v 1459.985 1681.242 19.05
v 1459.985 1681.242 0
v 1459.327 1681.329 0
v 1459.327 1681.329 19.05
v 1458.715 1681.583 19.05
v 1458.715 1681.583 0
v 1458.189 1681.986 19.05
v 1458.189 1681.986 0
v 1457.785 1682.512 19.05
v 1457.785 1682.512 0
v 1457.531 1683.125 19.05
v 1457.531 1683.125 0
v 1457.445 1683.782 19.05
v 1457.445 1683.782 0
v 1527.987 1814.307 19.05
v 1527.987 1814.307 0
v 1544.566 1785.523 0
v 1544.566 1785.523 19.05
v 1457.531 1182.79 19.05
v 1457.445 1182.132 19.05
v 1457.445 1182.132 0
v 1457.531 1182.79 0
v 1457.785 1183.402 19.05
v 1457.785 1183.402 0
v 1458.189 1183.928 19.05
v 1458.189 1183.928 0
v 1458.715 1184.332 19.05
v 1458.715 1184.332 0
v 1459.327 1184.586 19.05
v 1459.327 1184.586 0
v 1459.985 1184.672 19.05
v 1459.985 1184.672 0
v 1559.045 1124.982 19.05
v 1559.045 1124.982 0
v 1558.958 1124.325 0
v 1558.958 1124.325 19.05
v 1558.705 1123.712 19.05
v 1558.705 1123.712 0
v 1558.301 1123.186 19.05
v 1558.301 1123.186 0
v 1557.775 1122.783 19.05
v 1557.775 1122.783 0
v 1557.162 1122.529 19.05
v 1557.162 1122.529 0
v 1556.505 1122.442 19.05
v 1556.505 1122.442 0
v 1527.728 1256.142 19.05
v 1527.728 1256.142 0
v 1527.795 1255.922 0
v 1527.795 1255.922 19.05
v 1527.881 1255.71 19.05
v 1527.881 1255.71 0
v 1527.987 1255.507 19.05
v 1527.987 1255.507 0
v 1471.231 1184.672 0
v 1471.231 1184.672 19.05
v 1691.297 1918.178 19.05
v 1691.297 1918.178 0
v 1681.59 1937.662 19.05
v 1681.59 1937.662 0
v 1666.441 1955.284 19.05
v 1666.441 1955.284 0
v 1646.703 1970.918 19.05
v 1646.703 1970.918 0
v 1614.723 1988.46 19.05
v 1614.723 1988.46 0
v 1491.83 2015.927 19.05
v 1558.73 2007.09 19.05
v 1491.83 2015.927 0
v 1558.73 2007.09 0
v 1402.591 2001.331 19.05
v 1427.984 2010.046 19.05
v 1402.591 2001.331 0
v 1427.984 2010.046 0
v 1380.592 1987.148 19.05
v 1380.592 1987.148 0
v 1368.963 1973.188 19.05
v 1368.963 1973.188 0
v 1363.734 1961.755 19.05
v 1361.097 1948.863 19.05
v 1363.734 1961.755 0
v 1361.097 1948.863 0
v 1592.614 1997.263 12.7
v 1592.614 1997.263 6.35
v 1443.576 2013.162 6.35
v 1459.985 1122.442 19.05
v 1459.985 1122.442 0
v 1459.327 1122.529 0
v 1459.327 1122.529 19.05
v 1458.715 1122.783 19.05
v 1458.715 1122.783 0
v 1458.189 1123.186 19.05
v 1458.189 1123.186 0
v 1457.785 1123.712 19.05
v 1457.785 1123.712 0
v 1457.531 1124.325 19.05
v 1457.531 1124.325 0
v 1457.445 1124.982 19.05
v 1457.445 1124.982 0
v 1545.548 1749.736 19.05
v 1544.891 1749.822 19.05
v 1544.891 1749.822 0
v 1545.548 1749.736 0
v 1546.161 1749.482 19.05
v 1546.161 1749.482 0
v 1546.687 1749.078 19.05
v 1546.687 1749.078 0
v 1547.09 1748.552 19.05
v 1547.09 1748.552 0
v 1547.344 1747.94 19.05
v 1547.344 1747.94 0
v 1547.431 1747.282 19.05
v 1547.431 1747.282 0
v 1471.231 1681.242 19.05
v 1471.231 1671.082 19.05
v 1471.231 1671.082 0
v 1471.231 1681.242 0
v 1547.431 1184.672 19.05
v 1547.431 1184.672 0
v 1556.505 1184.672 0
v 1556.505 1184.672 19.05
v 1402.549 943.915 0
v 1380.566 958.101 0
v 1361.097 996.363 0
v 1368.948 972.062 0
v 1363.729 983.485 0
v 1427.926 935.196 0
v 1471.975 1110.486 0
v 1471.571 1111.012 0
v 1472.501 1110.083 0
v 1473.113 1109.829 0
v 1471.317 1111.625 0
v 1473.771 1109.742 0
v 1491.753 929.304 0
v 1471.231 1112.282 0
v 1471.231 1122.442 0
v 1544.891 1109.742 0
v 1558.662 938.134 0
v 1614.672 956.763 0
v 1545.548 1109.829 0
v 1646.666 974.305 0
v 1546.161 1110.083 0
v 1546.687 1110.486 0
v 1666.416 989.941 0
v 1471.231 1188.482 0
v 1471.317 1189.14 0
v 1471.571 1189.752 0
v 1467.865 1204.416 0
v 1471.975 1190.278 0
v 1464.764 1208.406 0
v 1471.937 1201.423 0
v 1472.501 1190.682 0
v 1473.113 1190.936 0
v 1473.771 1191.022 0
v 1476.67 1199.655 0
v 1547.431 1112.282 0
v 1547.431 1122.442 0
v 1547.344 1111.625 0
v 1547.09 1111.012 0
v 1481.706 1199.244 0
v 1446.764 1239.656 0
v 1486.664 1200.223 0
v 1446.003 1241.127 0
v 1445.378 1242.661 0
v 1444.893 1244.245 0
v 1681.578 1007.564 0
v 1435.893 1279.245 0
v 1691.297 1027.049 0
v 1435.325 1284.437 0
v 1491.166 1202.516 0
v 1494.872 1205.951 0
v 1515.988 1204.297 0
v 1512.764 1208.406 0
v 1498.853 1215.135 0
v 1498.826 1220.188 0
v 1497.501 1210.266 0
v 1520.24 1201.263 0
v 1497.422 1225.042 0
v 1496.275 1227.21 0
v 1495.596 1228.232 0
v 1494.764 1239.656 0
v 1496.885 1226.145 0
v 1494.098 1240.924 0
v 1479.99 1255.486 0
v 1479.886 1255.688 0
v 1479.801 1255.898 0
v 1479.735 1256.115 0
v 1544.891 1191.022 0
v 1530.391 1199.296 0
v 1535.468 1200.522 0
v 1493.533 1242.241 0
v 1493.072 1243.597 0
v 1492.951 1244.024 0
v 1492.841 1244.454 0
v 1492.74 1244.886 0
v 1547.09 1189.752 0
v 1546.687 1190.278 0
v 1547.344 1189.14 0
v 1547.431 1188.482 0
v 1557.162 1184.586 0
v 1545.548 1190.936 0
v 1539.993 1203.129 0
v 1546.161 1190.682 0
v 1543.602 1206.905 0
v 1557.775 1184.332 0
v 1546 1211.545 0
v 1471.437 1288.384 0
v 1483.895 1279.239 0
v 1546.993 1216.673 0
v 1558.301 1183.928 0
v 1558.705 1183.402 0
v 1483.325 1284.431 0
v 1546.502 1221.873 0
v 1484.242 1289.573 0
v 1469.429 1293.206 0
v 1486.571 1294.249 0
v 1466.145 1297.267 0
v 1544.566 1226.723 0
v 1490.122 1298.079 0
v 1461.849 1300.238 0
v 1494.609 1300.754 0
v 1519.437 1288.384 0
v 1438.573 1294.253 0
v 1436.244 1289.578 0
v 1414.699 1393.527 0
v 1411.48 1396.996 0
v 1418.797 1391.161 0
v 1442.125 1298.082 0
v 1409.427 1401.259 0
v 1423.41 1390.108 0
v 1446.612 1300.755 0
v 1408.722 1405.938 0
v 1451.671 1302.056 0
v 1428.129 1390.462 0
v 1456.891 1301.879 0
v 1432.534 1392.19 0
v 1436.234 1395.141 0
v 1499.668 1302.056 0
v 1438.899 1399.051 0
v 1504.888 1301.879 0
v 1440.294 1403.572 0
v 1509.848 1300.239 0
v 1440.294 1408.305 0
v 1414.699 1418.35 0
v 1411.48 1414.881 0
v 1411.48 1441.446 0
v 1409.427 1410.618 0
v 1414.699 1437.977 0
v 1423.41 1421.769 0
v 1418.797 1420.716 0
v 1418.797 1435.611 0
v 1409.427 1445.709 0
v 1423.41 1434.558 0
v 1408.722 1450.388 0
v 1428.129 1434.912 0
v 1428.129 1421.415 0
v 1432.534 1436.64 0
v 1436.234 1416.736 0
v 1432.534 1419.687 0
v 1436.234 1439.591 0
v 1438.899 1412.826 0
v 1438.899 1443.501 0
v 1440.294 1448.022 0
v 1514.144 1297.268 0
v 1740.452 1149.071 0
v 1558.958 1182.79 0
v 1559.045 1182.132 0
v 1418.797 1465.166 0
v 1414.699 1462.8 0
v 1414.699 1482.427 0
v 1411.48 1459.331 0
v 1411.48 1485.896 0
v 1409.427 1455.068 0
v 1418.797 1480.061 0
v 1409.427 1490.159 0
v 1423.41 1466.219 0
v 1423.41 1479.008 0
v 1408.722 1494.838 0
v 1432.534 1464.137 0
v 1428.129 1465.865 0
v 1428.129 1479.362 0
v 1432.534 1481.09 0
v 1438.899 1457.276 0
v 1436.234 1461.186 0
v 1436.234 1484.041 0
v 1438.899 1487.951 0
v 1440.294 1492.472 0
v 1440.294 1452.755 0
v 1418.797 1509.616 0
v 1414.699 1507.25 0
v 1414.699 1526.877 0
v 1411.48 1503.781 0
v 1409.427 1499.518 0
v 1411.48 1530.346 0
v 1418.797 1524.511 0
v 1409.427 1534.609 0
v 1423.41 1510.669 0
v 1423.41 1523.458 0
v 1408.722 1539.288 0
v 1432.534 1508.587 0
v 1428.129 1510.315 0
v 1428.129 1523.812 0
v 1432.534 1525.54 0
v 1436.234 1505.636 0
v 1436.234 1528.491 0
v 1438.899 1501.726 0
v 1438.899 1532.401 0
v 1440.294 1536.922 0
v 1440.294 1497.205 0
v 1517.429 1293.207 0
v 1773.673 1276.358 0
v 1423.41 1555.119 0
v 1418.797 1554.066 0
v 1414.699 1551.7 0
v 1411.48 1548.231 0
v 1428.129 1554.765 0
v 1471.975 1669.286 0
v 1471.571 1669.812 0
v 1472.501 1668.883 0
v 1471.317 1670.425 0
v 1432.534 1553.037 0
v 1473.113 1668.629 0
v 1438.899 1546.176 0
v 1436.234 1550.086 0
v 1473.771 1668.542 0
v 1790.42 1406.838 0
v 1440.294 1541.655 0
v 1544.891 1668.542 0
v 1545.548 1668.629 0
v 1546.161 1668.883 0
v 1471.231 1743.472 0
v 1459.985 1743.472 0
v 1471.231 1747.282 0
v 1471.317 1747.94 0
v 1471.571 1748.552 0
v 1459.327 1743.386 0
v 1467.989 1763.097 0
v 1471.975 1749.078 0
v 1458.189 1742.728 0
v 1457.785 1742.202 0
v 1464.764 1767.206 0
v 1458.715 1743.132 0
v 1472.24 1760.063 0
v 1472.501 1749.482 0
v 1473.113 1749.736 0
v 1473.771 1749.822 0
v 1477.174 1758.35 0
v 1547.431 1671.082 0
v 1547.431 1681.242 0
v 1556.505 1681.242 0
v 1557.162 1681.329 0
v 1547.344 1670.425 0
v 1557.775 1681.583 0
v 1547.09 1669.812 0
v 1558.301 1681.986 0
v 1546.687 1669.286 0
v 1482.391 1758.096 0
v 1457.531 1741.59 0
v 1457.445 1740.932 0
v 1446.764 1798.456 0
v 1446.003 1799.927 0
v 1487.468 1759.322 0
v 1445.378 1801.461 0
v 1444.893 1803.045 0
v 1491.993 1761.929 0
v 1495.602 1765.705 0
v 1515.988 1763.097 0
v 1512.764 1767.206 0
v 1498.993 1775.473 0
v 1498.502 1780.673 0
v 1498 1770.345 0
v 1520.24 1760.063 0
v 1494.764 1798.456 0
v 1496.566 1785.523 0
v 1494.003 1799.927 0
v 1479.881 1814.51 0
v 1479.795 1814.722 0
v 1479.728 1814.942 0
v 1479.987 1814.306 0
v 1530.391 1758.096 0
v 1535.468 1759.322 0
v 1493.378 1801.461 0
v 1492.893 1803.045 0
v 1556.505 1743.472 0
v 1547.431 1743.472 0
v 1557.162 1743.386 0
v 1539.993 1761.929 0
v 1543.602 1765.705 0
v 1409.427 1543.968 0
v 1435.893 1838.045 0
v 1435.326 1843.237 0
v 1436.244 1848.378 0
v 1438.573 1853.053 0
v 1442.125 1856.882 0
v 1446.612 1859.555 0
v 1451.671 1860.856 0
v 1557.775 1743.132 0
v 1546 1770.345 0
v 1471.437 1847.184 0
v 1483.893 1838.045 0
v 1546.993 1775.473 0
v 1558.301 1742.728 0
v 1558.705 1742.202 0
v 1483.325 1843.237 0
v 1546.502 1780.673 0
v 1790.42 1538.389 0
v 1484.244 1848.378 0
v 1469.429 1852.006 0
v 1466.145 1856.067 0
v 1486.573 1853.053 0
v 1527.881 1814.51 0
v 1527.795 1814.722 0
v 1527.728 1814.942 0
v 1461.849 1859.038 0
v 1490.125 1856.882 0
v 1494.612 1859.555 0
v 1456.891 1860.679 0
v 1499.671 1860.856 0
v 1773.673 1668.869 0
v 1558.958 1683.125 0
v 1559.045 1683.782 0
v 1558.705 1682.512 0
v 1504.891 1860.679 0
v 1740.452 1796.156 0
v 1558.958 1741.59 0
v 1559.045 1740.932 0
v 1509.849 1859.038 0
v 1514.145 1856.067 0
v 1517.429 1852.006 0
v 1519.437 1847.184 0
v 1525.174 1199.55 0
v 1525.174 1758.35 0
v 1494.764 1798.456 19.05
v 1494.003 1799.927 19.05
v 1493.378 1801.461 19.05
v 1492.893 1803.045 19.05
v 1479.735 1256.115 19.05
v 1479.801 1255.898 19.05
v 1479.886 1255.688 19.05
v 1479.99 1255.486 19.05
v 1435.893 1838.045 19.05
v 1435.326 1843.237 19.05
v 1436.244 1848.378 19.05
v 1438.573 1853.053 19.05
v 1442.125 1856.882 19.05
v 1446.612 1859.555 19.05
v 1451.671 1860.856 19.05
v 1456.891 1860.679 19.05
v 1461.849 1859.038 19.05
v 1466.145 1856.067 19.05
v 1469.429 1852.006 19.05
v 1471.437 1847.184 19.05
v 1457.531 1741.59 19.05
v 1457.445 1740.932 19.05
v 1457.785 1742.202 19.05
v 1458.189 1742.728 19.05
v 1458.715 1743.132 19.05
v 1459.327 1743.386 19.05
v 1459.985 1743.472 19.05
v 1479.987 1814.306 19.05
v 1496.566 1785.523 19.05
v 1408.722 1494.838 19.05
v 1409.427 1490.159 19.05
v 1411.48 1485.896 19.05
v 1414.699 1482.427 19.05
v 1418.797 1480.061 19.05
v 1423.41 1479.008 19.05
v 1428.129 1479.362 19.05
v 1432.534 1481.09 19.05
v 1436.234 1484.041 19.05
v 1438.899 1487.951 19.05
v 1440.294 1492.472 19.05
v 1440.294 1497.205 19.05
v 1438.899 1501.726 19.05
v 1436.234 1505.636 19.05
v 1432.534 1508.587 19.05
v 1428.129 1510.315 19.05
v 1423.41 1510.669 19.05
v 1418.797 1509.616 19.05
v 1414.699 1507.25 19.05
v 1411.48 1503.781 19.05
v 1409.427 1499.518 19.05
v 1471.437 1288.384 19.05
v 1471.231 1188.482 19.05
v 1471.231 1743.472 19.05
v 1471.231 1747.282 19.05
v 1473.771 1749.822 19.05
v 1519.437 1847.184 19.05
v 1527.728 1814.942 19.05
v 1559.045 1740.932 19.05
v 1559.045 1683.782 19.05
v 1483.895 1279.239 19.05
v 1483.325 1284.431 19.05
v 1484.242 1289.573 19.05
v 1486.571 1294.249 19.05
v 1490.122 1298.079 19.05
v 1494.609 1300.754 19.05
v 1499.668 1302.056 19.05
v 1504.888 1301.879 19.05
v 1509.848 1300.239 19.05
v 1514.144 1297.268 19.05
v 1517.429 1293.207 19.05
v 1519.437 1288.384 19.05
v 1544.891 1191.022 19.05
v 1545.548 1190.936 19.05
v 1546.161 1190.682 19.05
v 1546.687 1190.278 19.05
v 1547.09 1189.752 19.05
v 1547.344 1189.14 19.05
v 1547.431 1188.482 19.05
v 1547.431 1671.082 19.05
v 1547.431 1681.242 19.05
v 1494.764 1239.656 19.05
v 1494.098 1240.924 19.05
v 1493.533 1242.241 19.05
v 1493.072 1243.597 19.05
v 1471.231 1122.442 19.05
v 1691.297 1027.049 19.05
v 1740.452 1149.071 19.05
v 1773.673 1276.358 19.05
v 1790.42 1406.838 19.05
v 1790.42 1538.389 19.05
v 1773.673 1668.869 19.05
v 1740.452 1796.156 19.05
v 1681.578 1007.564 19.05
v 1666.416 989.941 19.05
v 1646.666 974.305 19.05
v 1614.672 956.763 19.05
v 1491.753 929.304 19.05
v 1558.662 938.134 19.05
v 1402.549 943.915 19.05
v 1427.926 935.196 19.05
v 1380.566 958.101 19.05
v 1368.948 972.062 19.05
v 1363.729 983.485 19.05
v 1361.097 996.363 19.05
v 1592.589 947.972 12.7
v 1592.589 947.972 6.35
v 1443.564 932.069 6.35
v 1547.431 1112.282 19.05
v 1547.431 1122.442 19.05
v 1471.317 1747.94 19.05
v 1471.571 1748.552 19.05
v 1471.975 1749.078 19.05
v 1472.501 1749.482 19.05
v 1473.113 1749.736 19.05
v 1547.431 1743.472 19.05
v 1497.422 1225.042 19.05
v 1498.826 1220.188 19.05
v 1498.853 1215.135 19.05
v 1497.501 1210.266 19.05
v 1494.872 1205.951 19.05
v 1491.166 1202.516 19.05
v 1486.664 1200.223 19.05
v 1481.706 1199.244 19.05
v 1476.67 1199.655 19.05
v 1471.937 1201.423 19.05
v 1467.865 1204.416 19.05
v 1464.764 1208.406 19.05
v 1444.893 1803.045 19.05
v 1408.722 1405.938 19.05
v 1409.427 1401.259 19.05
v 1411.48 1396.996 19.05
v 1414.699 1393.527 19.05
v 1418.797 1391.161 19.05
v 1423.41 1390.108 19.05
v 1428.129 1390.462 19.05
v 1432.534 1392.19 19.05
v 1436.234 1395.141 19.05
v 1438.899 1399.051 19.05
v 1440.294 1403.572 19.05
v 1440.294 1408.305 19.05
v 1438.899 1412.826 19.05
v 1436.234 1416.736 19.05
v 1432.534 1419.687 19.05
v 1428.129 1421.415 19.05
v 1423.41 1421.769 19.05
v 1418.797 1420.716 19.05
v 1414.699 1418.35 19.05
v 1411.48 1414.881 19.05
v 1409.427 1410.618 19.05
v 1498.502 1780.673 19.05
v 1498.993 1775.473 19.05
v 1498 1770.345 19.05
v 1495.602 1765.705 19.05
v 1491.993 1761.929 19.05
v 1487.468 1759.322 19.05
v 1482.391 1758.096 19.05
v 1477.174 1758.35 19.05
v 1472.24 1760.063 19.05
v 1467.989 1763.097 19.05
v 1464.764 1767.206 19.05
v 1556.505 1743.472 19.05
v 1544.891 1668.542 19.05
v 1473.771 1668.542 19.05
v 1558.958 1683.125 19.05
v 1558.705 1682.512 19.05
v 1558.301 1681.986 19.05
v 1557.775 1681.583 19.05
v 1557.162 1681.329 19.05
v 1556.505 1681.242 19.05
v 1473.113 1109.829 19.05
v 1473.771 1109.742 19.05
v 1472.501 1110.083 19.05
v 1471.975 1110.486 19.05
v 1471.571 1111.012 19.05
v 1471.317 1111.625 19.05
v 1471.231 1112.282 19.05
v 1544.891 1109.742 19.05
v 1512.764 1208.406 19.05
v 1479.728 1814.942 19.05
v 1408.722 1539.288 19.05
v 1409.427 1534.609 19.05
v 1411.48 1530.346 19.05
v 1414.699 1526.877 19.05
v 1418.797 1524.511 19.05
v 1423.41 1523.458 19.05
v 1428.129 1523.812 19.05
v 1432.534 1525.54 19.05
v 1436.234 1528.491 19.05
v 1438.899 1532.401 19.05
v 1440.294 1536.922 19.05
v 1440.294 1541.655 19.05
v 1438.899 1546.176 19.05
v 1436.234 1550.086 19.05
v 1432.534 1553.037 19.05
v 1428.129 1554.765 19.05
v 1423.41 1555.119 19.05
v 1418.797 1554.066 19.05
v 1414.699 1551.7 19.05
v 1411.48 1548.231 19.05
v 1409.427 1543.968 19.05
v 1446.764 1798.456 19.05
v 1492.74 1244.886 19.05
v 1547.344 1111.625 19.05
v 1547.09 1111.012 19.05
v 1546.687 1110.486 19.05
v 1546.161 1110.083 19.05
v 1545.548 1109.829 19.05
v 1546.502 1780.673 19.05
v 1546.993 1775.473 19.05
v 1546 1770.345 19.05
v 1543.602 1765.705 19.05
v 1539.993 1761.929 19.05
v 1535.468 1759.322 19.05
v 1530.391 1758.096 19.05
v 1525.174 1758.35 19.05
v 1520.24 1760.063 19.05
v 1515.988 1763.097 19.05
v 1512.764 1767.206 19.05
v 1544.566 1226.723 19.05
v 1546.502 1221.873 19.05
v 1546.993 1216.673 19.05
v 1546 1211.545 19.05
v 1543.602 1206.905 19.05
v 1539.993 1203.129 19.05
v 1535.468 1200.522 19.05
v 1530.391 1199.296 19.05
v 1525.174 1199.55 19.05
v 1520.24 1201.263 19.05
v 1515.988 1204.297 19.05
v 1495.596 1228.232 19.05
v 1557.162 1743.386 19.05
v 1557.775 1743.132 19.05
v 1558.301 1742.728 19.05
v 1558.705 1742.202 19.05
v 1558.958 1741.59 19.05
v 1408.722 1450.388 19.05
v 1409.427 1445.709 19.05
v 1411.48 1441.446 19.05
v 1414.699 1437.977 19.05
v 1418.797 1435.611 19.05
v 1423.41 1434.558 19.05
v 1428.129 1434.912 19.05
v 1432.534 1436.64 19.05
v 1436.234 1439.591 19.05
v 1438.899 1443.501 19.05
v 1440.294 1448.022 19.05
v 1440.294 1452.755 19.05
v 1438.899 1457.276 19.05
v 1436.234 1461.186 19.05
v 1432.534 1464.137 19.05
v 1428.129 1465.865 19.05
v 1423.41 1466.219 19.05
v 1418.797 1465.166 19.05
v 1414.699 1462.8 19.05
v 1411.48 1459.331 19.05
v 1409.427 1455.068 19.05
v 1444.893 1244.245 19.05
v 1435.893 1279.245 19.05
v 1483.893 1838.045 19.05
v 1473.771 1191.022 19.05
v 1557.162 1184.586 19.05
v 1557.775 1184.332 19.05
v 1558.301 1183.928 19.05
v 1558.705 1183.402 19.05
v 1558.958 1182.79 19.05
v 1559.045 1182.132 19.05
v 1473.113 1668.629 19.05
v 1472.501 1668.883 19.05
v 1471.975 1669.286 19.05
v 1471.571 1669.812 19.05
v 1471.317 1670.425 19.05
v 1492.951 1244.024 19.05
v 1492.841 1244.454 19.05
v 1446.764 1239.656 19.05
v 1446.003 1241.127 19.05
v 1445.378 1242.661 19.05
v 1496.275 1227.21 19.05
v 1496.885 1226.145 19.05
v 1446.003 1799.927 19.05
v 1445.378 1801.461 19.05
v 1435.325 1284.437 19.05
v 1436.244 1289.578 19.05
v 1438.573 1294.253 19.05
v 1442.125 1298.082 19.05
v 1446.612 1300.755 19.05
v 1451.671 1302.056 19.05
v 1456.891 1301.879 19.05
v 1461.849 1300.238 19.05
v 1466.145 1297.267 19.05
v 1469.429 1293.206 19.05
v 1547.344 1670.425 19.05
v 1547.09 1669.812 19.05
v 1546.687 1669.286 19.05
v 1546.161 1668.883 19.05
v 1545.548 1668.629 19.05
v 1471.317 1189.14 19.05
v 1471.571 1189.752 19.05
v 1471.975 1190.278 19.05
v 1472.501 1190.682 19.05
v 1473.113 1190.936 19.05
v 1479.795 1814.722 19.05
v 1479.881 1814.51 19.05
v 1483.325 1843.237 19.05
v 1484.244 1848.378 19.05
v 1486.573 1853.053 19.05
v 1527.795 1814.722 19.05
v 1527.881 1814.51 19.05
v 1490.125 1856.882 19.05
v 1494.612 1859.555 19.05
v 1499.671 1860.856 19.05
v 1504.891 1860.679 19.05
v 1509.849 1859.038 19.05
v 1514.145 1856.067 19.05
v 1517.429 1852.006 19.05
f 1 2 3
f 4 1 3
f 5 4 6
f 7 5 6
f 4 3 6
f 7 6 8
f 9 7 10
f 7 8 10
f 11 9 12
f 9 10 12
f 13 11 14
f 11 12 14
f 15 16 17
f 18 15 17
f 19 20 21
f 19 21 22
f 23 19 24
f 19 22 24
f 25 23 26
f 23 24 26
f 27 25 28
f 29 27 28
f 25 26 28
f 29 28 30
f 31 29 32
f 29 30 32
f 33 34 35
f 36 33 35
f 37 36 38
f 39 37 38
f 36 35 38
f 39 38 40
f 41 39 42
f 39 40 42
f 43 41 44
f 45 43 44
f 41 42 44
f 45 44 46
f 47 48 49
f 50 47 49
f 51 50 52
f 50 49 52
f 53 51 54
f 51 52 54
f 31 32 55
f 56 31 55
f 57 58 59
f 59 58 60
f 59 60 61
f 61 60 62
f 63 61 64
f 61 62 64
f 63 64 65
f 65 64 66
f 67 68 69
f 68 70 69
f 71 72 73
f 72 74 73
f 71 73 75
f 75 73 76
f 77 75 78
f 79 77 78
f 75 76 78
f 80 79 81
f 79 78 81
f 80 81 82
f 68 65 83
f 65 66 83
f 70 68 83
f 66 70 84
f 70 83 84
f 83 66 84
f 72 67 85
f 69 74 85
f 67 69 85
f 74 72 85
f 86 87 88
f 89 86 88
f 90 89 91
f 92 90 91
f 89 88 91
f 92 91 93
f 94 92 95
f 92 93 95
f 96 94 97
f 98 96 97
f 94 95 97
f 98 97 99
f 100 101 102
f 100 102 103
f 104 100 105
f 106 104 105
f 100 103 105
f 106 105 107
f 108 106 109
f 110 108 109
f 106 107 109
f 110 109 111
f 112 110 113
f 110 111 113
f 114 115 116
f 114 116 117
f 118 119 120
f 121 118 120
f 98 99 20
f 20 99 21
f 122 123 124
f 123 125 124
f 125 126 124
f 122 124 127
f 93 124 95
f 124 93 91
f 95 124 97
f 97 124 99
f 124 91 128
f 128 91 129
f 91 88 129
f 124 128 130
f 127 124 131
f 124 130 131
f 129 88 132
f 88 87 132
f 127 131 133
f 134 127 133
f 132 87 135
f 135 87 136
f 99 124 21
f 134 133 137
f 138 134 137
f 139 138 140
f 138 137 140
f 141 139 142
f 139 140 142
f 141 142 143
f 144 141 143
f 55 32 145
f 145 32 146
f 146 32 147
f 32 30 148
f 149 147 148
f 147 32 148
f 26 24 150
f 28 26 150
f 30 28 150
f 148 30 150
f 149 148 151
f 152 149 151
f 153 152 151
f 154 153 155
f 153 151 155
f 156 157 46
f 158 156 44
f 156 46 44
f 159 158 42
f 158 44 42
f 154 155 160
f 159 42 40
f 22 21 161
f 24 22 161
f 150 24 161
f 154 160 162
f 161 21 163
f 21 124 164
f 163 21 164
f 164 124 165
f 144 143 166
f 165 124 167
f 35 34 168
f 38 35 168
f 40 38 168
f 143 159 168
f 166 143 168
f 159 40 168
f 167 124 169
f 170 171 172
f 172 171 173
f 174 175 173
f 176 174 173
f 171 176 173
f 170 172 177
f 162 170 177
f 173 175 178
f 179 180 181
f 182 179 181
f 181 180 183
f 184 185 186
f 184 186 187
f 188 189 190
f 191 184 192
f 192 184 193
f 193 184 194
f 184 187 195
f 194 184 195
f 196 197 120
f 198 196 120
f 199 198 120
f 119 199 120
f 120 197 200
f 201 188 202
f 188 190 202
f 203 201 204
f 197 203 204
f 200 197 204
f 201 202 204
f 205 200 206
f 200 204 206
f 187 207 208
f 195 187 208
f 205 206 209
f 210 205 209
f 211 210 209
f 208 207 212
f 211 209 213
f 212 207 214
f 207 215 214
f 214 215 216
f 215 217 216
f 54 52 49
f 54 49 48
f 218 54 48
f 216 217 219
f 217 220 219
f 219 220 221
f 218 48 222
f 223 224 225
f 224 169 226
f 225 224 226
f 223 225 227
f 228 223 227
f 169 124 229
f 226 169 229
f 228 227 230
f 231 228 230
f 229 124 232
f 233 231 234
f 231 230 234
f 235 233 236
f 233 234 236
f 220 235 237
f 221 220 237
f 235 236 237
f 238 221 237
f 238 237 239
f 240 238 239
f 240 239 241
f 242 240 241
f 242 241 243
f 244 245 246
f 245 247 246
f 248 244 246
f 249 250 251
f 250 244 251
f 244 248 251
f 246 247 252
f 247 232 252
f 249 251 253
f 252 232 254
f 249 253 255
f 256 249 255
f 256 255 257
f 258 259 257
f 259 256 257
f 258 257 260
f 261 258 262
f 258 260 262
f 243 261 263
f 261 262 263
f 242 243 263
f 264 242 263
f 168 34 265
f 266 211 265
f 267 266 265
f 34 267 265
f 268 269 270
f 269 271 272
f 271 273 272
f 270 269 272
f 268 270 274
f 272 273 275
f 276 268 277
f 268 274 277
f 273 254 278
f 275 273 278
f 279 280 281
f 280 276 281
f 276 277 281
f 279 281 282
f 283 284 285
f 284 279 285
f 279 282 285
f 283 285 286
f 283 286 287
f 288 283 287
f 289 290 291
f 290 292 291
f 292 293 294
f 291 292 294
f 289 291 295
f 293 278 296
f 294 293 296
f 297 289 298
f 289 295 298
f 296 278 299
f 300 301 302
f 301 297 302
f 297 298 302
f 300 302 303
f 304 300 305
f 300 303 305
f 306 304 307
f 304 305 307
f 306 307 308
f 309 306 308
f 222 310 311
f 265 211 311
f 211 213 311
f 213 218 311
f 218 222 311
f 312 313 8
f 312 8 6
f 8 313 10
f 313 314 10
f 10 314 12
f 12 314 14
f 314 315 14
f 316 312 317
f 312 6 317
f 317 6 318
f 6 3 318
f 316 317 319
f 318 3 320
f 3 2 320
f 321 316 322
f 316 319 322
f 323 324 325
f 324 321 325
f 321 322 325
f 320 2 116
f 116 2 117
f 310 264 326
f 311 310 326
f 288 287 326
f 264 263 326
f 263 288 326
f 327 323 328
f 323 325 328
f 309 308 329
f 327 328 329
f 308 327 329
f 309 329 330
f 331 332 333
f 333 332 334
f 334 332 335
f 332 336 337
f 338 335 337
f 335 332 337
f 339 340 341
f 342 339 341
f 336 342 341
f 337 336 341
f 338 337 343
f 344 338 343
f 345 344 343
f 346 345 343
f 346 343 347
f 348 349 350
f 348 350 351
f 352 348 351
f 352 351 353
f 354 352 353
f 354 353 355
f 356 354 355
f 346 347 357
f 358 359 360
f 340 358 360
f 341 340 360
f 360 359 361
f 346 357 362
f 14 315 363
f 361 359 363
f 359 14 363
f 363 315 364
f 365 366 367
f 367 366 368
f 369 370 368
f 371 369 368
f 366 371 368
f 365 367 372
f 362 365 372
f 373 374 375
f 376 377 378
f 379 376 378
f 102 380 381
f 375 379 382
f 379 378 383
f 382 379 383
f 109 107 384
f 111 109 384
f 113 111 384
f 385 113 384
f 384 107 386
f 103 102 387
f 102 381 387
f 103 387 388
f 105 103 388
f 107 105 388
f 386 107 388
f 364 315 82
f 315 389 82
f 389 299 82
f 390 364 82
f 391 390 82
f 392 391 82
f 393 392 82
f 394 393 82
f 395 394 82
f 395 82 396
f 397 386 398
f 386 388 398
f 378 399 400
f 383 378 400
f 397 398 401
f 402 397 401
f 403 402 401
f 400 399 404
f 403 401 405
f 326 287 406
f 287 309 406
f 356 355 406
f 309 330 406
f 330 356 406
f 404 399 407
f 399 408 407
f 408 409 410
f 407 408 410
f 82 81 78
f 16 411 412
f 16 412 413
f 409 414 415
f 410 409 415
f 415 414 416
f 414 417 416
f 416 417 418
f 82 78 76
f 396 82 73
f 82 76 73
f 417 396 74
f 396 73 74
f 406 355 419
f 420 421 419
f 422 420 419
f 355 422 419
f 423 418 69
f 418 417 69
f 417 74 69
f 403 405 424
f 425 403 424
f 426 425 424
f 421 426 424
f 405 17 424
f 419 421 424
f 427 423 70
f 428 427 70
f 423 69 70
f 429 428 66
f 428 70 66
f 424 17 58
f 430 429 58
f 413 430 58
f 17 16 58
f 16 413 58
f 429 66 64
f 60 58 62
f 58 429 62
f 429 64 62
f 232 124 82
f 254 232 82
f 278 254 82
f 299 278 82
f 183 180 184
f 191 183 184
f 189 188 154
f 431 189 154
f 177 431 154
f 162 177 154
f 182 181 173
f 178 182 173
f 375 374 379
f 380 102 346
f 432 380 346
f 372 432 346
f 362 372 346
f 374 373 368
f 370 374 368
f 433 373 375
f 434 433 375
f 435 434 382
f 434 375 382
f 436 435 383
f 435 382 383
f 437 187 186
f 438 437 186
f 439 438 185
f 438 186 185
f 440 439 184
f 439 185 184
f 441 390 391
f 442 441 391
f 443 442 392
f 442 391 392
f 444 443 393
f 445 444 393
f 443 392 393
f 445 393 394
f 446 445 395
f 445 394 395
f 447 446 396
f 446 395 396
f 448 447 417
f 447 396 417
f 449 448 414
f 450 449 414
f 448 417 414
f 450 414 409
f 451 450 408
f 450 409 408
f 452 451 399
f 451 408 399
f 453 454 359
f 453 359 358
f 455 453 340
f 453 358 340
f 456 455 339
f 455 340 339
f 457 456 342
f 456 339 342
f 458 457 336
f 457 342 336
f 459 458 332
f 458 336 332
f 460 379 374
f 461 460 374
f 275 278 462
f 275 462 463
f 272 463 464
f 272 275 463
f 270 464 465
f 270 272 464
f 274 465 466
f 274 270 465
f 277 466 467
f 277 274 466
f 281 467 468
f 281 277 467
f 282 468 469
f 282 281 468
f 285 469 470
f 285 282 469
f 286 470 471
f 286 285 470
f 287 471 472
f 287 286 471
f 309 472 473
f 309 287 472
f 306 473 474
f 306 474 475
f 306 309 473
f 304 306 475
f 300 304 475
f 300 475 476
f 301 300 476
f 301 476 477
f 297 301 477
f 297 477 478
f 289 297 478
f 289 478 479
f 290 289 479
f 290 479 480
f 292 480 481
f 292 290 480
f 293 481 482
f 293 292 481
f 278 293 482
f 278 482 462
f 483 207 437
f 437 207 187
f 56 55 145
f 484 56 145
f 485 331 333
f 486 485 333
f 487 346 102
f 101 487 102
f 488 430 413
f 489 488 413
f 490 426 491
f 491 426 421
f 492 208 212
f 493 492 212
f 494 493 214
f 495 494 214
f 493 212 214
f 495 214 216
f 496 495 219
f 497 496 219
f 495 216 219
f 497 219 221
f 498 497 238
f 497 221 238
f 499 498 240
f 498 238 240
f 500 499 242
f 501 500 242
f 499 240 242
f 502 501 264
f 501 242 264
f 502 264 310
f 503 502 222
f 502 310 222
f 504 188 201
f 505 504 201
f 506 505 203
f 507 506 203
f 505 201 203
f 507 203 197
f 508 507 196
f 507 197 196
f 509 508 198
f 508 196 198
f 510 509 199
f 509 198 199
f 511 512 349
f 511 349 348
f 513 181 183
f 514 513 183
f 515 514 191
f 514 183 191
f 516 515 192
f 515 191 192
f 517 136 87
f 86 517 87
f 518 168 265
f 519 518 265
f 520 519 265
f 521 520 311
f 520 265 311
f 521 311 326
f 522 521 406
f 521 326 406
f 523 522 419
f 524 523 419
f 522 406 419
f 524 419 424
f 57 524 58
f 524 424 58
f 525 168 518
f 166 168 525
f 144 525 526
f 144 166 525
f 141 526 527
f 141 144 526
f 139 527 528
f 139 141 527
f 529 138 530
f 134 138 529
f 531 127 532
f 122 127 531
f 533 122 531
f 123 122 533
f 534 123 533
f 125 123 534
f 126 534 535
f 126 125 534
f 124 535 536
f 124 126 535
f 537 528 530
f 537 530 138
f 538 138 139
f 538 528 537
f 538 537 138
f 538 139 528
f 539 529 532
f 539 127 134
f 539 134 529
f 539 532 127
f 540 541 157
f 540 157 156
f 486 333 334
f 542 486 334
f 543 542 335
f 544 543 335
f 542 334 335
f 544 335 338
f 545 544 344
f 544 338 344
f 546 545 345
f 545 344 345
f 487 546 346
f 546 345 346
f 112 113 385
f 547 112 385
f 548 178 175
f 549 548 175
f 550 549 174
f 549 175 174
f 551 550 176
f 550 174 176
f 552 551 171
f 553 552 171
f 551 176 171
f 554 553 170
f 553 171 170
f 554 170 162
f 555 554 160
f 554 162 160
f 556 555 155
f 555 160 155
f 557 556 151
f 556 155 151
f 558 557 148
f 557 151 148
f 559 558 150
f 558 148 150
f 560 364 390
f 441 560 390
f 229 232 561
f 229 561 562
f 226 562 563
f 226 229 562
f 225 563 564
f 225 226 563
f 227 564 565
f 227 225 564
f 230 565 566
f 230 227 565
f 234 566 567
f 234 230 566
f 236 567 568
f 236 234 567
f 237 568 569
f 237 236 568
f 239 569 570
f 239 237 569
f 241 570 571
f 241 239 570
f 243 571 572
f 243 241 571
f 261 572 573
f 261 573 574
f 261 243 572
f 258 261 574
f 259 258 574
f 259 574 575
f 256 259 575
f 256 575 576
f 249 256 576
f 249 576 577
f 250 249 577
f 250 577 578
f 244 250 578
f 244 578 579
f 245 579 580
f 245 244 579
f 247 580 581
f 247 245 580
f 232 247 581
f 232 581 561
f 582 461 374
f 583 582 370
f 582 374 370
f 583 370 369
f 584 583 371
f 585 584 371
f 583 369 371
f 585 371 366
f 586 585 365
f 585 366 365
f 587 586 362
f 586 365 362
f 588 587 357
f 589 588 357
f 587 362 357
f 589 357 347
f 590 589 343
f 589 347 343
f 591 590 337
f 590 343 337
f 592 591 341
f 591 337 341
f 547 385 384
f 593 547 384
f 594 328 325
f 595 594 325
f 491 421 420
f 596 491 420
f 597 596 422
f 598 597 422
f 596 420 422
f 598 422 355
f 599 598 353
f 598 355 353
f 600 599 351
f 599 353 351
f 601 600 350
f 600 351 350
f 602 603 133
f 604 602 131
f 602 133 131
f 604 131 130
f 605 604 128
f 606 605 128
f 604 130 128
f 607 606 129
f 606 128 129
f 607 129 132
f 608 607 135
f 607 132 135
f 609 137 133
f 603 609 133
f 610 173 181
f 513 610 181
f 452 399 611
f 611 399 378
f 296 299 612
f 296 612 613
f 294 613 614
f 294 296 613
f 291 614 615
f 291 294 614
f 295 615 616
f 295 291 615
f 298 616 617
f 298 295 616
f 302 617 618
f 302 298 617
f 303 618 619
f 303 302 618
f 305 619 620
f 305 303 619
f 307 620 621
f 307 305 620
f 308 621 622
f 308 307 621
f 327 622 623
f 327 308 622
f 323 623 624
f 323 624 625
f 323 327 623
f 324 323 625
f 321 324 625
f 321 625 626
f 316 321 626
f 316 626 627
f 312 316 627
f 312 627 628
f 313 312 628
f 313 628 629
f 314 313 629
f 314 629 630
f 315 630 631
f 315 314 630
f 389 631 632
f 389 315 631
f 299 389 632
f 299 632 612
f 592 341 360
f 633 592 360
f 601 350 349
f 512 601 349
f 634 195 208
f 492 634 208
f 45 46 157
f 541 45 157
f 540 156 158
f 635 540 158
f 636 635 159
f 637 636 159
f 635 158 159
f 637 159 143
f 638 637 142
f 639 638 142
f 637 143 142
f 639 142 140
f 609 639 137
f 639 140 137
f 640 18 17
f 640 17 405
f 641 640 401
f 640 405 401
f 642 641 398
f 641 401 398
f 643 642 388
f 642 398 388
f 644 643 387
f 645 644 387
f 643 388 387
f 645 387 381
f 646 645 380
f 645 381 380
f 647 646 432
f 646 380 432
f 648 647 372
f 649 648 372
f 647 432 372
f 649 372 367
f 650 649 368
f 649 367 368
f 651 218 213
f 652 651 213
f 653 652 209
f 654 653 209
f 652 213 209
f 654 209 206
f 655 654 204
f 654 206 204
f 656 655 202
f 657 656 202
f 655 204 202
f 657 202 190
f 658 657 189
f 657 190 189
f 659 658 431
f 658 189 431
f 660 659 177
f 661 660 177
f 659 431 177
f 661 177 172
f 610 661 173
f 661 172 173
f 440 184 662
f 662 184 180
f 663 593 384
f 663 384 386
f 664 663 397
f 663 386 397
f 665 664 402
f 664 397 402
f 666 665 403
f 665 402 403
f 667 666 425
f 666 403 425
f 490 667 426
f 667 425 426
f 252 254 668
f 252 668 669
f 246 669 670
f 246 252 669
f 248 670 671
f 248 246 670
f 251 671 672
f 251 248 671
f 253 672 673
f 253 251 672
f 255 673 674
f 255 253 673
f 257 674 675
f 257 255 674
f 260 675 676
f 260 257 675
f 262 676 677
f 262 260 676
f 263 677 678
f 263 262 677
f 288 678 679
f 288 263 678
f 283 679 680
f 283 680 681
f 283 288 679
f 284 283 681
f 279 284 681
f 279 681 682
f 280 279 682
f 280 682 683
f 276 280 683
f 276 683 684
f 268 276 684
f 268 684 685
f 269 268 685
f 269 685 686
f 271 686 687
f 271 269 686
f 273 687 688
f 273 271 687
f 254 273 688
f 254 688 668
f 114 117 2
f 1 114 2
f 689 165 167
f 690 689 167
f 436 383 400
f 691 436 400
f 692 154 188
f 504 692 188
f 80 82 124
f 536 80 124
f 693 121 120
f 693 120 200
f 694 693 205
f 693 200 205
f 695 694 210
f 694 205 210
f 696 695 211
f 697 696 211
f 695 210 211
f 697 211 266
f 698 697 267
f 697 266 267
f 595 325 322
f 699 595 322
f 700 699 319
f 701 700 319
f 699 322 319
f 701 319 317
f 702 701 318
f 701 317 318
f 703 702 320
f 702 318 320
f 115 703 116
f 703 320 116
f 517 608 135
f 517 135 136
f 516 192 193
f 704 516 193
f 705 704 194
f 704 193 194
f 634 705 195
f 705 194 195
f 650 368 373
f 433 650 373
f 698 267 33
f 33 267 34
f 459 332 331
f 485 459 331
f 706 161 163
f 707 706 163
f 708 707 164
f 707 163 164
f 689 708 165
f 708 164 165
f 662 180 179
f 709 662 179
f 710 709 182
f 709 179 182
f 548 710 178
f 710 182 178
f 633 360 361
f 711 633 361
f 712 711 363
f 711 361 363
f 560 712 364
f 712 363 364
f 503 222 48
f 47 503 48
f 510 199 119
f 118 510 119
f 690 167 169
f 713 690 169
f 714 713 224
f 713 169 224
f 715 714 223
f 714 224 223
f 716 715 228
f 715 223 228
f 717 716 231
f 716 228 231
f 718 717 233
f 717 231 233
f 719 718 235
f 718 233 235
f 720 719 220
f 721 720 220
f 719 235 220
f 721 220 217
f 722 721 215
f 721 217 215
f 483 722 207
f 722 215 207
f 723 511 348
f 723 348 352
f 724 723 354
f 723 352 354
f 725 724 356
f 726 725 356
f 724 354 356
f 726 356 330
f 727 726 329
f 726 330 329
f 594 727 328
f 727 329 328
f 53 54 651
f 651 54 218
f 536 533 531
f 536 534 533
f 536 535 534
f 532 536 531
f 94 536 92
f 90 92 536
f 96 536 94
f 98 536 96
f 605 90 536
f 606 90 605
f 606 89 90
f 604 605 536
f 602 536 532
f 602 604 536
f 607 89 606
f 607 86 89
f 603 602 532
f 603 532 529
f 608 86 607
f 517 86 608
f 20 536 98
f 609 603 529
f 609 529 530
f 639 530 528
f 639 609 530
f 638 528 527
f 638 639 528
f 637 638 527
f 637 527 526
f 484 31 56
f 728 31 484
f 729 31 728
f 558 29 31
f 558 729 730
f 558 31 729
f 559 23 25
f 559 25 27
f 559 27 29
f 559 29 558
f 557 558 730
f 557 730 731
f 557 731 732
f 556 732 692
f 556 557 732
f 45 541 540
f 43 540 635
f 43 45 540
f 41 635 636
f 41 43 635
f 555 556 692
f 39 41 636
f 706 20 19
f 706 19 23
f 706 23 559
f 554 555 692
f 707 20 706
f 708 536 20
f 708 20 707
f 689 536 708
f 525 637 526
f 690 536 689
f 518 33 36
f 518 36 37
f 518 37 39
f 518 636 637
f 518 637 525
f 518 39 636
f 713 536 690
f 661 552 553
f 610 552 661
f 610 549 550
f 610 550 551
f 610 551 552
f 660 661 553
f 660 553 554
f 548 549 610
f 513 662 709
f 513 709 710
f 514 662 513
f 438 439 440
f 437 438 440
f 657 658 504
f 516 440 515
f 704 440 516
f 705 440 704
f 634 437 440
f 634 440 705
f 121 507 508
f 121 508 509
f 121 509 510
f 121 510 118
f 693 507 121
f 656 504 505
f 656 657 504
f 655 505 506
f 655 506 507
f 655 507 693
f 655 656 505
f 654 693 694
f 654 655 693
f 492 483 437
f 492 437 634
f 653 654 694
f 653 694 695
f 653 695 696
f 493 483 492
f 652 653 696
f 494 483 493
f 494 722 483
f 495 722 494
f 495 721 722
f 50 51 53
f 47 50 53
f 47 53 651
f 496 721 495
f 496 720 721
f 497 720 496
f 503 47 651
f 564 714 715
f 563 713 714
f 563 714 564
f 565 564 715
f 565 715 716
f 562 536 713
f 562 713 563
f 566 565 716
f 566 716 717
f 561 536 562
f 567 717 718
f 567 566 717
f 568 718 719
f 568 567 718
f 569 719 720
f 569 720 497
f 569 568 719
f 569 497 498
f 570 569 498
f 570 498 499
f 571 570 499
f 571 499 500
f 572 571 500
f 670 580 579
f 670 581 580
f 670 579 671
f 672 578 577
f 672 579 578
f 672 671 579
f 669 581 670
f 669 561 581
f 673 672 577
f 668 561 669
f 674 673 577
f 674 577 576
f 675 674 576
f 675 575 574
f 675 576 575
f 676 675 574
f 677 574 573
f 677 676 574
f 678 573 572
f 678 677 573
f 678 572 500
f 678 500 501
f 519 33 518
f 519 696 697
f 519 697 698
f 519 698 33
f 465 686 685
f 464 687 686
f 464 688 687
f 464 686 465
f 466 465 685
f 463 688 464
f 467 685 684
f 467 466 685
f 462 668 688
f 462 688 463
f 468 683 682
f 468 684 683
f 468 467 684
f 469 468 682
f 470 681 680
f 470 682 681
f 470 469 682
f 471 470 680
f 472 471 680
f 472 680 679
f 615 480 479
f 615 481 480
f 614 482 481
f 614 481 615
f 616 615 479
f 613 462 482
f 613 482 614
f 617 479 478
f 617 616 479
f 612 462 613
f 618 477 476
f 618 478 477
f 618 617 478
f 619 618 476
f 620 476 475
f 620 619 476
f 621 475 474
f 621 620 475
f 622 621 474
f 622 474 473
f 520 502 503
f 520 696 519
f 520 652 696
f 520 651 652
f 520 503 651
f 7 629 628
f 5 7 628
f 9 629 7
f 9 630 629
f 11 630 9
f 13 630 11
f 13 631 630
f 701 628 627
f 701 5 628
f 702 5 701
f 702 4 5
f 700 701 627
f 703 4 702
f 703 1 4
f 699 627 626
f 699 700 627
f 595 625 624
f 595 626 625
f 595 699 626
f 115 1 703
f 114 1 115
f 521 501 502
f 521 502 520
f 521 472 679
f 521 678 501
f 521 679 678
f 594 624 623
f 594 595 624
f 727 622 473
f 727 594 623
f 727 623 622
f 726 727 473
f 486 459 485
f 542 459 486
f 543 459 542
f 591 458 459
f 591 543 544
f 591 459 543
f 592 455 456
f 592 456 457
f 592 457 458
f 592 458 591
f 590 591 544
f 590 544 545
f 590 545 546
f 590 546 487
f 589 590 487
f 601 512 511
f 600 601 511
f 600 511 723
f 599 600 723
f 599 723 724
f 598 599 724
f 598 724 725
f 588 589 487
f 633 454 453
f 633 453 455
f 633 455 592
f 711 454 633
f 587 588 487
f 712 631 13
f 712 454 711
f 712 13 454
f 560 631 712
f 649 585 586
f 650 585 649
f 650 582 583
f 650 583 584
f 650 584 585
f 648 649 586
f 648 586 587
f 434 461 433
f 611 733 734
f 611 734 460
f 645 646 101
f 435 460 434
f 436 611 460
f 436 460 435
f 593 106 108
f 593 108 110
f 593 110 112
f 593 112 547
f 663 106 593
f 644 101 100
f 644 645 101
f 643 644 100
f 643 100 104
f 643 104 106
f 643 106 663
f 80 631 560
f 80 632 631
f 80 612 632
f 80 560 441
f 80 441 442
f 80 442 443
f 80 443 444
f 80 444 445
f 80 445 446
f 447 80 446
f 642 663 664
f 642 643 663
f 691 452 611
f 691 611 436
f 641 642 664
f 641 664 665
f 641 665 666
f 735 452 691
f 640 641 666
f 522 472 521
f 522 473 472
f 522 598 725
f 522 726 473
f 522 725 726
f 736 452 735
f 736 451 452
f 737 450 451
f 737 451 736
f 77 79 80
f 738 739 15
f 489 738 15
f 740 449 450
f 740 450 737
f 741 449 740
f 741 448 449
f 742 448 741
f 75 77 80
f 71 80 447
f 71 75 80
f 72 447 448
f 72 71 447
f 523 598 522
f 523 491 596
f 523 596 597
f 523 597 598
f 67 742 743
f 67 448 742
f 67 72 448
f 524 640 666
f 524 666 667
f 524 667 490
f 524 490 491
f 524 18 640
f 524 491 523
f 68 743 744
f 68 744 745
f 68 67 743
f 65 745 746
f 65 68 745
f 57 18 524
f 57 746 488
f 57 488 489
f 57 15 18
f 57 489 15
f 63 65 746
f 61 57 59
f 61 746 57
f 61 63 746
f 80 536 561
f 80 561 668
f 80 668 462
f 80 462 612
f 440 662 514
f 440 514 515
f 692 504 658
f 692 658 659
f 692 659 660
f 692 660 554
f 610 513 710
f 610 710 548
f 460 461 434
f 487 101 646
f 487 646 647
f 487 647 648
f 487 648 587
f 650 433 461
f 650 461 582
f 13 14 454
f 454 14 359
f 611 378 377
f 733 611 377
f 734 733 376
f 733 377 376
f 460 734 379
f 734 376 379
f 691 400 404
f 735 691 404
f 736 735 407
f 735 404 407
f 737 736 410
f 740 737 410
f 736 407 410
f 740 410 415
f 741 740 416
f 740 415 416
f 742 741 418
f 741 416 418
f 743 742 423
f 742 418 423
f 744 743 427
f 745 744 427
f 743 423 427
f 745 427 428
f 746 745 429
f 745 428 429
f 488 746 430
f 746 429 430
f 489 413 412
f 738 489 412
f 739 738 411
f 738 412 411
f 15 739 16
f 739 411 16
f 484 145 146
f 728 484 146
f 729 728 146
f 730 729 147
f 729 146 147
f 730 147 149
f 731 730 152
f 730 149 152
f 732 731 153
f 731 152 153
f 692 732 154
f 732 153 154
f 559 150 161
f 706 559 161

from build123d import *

# Parameters (mm, degrees)
SKETCH19_R          = 15.875
BOSS_EXTRUDE2_DEPTH = 19.05


with BuildPart() as part:
    # Sketch19 → Boss-Extrude2 (new body)
    with BuildSketch(Plane.XY):
        with BuildLine():
            add(Edge.make_bspline(
                [(1691.296561672, 1918.177904127), (1656.762851887, 2023.18607917), (1371.325091688, 2058.930160841), (1361.096561672, 1948.863494174)],
                knots=[0, 0, 0, 0, 7.638294788, 7.638294788, 7.638294788, 7.638294788], degree=3))
            Line((1361.096561672, 1948.863494174), (1361.096561672, 996.363494174))
            add(Edge.make_bspline(
                [(1691.296561672, 1027.049084222), (1656.707719979, 922.059056278), (1371.325091688, 886.296827508), (1361.096561672, 996.363494174)],
                knots=[0, 0, 0, 0, 7.629784399, 7.629784399, 7.629784399, 7.629784399], degree=3))
            ThreePointArc((1691.296561672, 1027.049084222), (1792.519416014, 1472.613494174), (1691.296561672, 1918.177904127))
        make_face()
        with BuildLine():
            Line((1556.504865632, 1122.44241392), (1547.43077252, 1122.44241392))
            Line((1547.43077252, 1122.44241392), (1547.43077252, 1112.28241392))
            ThreePointArc((1547.43077252, 1112.28241392), (1546.686823744, 1110.486362696), (1544.89077252, 1109.74241392))
            Line((1544.89077252, 1109.74241392), (1473.77077252, 1109.74241392))
            ThreePointArc((1473.77077252, 1109.74241392), (1471.974721296, 1110.486362696), (1471.23077252, 1112.28241392))
            Line((1471.23077252, 1112.28241392), (1471.23077252, 1122.44241392))
            Line((1471.23077252, 1122.44241392), (1459.984865632, 1122.44241392))
            ThreePointArc((1459.984865632, 1122.44241392), (1458.188814408, 1123.186362696), (1457.444865632, 1124.98241392))
            Line((1457.444865632, 1124.98241392), (1457.444865632, 1182.13241392))
            ThreePointArc((1457.444865632, 1182.13241392), (1458.188814408, 1183.928465145), (1459.984865632, 1184.67241392))
            Line((1459.984865632, 1184.67241392), (1471.23077252, 1184.67241392))
            Line((1471.23077252, 1184.67241392), (1471.23077252, 1188.48241392))
            ThreePointArc((1471.23077252, 1188.48241392), (1471.974721296, 1190.278465145), (1473.77077252, 1191.02241392))
            Line((1473.77077252, 1191.02241392), (1544.89077252, 1191.02241392))
            ThreePointArc((1544.89077252, 1191.02241392), (1546.686823744, 1190.278465145), (1547.43077252, 1188.48241392))
            Line((1547.43077252, 1188.48241392), (1547.43077252, 1184.67241392))
            Line((1547.43077252, 1184.67241392), (1556.504865632, 1184.67241392))
            ThreePointArc((1556.504865632, 1184.67241392), (1558.300916856, 1183.928465145), (1559.044865632, 1182.13241392))
            Line((1559.044865632, 1182.13241392), (1559.044865632, 1124.98241392))
            ThreePointArc((1559.044865632, 1124.98241392), (1558.300916856, 1123.186362696), (1556.504865632, 1122.44241392))
        make_face(mode=Mode.SUBTRACT)
        with BuildLine():
            Line((1444.893065071, 1244.244623225), (1435.893057671, 1279.244553225))
            ThreePointArc((1435.893057671, 1279.244553225), (1449.094985702, 1301.58631231), (1471.436744787, 1288.384384279))
            Line((1471.436744787, 1288.384384279), (1479.734522372, 1256.115340295))
            ThreePointArc((1479.734522372, 1256.115340295), (1479.841246759, 1255.791962976), (1479.990269115, 1255.485768066))
            Line((1479.990269115, 1255.485768066), (1495.595800102, 1228.231937145))
            ThreePointArc((1495.595800102, 1228.231937145), (1496.589194493, 1226.682766417), (1497.422422708, 1225.041884612))
            ThreePointArc((1497.422422708, 1225.041884612), (1488.994111708, 1201.213784587), (1464.764130707, 1208.40564094))
            Line((1464.764130707, 1208.40564094), (1446.764069078, 1239.655616711))
            ThreePointArc((1446.764069078, 1239.655616711), (1445.672935755, 1241.886666839), (1444.893065071, 1244.244623225))
        make_face(mode=Mode.SUBTRACT)
        with Locations(Location((1424.596561672, 1405.938494174, 0), (0, 0, 180))):
            Circle(SKETCH19_R, mode=Mode.SUBTRACT)
        with Locations(Location((1424.596561672, 1450.388494174, 0), (0, 0, 180))):
            Circle(SKETCH19_R, mode=Mode.SUBTRACT)
        with BuildLine():
            Line((1527.986726026, 1255.506514787), (1544.56575997, 1226.723451874))
            ThreePointArc((1544.56575997, 1226.723451874), (1537.823790218, 1201.663704337), (1512.764042681, 1208.405674089))
            Line((1512.764042681, 1208.405674089), (1494.764045881, 1239.655687936))
            ThreePointArc((1494.764045881, 1239.655687936), (1493.802589185, 1241.576837352), (1493.072252129, 1243.597189262))
            ThreePointArc((1493.072252129, 1243.597189262), (1492.894588833, 1244.238723731), (1492.740311476, 1244.886280075))
            Line((1492.740311476, 1244.886280075), (1483.894581433, 1279.238653731))
            ThreePointArc((1483.894581433, 1279.238653731), (1497.09201275, 1301.585586702), (1519.436740684, 1288.384422355))
            Line((1519.436740684, 1288.384422355), (1527.727745028, 1256.141718681))
            ThreePointArc((1527.727745028, 1256.141718681), (1527.835693423, 1255.815333734), (1527.986726026, 1255.506514787))
        make_face(mode=Mode.SUBTRACT)
        with Locations(Location((1424.596561672, 1494.838494174, 0), (0, 0, 180))):
            Circle(SKETCH19_R, mode=Mode.SUBTRACT)
        with Locations(Location((1424.596561672, 1539.288494174, 0), (0, 0, 180))):
            Circle(SKETCH19_R, mode=Mode.SUBTRACT)
        with BuildLine():
            Line((1547.43077252, 1681.24241392), (1547.43077252, 1671.08241392))
            ThreePointArc((1547.43077252, 1671.08241392), (1546.686823744, 1669.286362696), (1544.89077252, 1668.54241392))
            Line((1544.89077252, 1668.54241392), (1473.77077252, 1668.54241392))
            ThreePointArc((1473.77077252, 1668.54241392), (1471.974721296, 1669.286362696), (1471.23077252, 1671.08241392))
            Line((1471.23077252, 1671.08241392), (1471.23077252, 1681.24241392))
            Line((1471.23077252, 1681.24241392), (1459.984865632, 1681.24241392))
            ThreePointArc((1459.984865632, 1681.24241392), (1458.188814408, 1681.986362696), (1457.444865632, 1683.78241392))
            Line((1457.444865632, 1683.78241392), (1457.444865632, 1740.93241392))
            ThreePointArc((1457.444865632, 1740.93241392), (1458.188814408, 1742.728465145), (1459.984865632, 1743.47241392))
            Line((1459.984865632, 1743.47241392), (1471.23077252, 1743.47241392))
            Line((1471.23077252, 1743.47241392), (1471.23077252, 1747.28241392))
            ThreePointArc((1471.23077252, 1747.28241392), (1471.974721296, 1749.078465145), (1473.77077252, 1749.82241392))
            Line((1473.77077252, 1749.82241392), (1544.89077252, 1749.82241392))
            ThreePointArc((1544.89077252, 1749.82241392), (1546.686823744, 1749.078465145), (1547.43077252, 1747.28241392))
            Line((1547.43077252, 1747.28241392), (1547.43077252, 1743.47241392))
            Line((1547.43077252, 1743.47241392), (1556.504865632, 1743.47241392))
            ThreePointArc((1556.504865632, 1743.47241392), (1558.300916856, 1742.728465145), (1559.044865632, 1740.93241392))
            Line((1559.044865632, 1740.93241392), (1559.044865632, 1683.78241392))
            ThreePointArc((1559.044865632, 1683.78241392), (1558.300916856, 1681.986362696), (1556.504865632, 1681.24241392))
            Line((1556.504865632, 1681.24241392), (1547.43077252, 1681.24241392))
        make_face(mode=Mode.SUBTRACT)
        with BuildLine():
            Line((1444.893131568, 1803.044661302), (1435.893124168, 1838.044591302))
            ThreePointArc((1435.893124168, 1838.044591302), (1449.095052199, 1860.386350386), (1471.436811284, 1847.184422355))
            Line((1471.436811284, 1847.184422355), (1479.727821657, 1814.941695236))
            ThreePointArc((1479.727821657, 1814.941695236), (1479.835768961, 1814.615312965), (1479.98679977, 1814.30649635))
            Line((1479.98679977, 1814.30649635), (1496.565772911, 1785.52338757))
            ThreePointArc((1496.565772911, 1785.52338757), (1489.823779303, 1760.463721825), (1464.764105889, 1767.205686923))
            Line((1464.764105889, 1767.205686923), (1446.764116481, 1798.455687936))
            ThreePointArc((1446.764116481, 1798.455687936), (1445.672995031, 1800.686722627), (1444.893131568, 1803.044661302))
        make_face(mode=Mode.SUBTRACT)
        with BuildLine():
            Line((1492.893060968, 1803.044661302), (1483.893053568, 1838.044591302))
            ThreePointArc((1483.893053568, 1838.044591302), (1497.094981599, 1860.386350386), (1519.436740684, 1847.184422355))
            Line((1519.436740684, 1847.184422355), (1527.727745028, 1814.941718681))
            ThreePointArc((1527.727745028, 1814.941718681), (1527.835693423, 1814.615333734), (1527.986726026, 1814.306514787))
            Line((1527.986726026, 1814.306514787), (1544.56575257, 1785.523464721))
            ThreePointArc((1544.56575257, 1785.523464721), (1537.823782818, 1760.463717184), (1512.764035281, 1767.205686936))
            Line((1512.764035281, 1767.205686936), (1494.764045881, 1798.455687936))
            ThreePointArc((1494.764045881, 1798.455687936), (1493.672924431, 1800.686722627), (1492.893060968, 1803.044661302))
        make_face(mode=Mode.SUBTRACT)
    extrude(amount=BOSS_EXTRUDE2_DEPTH)


solid = part.part
